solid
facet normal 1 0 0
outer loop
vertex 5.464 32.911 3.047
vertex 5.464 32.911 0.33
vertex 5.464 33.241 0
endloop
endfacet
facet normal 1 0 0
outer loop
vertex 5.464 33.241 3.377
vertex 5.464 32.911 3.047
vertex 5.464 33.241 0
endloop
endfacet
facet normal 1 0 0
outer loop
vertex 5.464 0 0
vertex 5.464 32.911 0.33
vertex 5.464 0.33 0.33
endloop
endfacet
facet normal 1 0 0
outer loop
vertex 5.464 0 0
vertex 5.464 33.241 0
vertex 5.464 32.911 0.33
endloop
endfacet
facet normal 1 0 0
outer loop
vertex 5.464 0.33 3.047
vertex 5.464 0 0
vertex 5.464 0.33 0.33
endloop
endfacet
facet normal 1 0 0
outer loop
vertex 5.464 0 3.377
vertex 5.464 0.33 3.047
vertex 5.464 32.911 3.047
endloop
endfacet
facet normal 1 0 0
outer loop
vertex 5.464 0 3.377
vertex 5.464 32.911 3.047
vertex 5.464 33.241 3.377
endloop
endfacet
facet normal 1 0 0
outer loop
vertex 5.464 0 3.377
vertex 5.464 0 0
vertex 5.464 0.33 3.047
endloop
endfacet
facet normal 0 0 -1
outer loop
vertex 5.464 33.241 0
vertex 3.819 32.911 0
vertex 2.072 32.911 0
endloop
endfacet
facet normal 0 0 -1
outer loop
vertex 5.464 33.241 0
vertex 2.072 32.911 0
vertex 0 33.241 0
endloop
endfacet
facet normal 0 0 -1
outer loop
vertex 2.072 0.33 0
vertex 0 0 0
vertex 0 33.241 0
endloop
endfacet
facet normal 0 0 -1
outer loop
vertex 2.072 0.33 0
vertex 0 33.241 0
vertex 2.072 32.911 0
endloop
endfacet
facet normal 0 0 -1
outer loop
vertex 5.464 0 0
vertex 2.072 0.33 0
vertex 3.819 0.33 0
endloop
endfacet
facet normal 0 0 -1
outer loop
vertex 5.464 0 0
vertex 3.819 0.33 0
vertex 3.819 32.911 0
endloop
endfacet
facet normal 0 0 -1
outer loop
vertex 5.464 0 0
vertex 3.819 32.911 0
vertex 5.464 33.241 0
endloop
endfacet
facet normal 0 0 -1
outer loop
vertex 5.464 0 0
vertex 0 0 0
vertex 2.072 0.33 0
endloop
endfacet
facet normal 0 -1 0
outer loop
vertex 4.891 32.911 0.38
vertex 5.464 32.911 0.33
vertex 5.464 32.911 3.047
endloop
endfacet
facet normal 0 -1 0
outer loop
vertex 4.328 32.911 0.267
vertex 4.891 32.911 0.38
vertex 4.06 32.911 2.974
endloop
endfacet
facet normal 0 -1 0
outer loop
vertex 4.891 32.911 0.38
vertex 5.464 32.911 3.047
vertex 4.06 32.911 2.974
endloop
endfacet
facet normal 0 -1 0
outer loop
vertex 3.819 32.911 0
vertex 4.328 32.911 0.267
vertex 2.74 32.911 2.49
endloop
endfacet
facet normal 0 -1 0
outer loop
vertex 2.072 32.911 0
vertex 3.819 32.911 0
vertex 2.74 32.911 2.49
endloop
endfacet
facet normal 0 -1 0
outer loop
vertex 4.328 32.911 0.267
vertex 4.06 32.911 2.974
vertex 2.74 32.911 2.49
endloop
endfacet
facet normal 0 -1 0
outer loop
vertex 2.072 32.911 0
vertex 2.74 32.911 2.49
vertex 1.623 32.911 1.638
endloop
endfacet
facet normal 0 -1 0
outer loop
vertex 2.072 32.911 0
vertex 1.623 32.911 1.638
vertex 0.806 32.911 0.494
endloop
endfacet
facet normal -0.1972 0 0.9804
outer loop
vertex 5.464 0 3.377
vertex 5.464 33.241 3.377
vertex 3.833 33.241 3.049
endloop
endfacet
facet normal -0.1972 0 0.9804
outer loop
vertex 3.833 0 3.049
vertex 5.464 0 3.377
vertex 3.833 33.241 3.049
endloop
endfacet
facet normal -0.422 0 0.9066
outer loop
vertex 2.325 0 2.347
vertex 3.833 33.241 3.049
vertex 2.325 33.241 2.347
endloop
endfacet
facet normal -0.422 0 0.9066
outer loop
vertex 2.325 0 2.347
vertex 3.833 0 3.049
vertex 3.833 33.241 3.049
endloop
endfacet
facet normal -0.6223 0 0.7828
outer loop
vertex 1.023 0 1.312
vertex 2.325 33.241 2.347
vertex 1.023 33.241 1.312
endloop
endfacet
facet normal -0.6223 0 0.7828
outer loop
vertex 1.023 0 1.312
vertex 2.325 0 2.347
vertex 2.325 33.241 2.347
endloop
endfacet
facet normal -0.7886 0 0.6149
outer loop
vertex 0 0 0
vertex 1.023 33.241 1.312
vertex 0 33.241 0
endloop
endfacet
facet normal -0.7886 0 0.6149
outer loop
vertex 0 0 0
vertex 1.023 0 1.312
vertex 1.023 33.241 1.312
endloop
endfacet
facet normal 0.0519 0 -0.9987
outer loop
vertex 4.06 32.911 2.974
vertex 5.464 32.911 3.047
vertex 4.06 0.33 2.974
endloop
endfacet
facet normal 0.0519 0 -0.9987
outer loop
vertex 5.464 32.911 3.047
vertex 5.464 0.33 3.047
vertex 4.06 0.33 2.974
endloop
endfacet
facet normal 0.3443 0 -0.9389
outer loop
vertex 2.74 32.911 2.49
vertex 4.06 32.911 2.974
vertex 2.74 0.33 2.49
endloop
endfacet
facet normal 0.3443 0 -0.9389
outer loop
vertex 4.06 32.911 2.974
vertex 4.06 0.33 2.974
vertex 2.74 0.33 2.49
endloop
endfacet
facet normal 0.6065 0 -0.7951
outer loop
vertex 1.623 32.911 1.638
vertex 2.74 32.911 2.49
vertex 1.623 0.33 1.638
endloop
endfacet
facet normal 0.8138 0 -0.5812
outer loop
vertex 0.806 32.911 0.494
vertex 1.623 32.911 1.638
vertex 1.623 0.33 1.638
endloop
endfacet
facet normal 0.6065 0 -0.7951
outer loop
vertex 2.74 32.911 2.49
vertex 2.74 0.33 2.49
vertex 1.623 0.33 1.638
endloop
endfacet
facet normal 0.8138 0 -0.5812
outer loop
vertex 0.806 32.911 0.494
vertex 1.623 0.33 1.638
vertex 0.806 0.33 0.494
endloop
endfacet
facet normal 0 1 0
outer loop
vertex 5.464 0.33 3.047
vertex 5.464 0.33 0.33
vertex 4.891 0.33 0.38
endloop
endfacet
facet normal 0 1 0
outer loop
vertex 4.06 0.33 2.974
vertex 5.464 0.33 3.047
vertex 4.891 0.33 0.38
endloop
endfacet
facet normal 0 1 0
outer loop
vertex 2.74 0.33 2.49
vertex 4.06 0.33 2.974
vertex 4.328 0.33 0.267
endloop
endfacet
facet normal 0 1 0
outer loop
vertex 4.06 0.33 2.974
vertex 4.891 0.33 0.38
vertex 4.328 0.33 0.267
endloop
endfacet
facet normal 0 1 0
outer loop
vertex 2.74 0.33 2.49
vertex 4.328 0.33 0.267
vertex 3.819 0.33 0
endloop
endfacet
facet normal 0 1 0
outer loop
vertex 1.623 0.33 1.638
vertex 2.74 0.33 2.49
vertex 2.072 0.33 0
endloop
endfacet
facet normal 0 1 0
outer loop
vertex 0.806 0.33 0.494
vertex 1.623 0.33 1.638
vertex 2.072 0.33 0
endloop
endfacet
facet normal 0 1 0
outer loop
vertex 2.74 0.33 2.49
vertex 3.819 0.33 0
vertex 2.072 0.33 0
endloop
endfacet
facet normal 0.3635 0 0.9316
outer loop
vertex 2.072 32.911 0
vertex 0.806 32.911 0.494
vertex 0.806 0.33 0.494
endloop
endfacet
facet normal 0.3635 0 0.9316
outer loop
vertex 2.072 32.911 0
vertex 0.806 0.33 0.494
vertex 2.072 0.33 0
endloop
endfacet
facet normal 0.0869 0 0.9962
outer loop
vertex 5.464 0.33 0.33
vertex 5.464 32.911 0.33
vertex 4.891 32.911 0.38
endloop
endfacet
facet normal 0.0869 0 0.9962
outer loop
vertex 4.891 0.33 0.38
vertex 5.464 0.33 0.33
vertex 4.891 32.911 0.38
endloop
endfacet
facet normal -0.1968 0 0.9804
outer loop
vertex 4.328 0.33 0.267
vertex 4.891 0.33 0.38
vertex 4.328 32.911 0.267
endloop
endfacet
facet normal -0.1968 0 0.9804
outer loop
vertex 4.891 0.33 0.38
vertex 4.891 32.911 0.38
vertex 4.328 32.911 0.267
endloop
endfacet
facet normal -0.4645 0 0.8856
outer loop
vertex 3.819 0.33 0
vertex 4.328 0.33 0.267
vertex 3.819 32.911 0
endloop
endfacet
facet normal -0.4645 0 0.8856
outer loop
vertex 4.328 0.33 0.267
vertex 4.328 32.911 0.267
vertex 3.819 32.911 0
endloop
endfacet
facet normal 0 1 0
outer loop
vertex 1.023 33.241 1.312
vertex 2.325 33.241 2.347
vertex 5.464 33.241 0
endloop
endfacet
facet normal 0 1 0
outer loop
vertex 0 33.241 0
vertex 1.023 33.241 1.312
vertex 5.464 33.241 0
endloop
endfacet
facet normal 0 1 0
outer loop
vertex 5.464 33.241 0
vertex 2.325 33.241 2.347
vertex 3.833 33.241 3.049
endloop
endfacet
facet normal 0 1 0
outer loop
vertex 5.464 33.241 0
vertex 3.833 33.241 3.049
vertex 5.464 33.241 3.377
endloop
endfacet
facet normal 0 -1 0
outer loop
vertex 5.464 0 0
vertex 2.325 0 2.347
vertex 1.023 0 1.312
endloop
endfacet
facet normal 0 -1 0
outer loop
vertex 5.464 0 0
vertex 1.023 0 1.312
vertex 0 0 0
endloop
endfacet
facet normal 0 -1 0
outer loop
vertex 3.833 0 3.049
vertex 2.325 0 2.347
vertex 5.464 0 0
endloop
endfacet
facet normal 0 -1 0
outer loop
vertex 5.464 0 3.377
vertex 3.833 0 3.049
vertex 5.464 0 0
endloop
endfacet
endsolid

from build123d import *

# Parameters (mm, degrees)
F1_DEPTH = 33.24098
F2_W     = 32.58058
F2_H     = 2.716841


with BuildPart() as f1:
    # F0 (on Front) → F1 (new body)
    with BuildSketch(Plane.XZ):
        with BuildLine():
            ThreePointArc((5.46354, 1.68862), (3.856251, 1.234842), (2.73177, 0))
            Line((2.73177, 0), (5.46354, 0))
            Line((5.46354, 0), (5.46354, 1.68862))
        make_face()
        with BuildLine():
            ThreePointArc((5.46354, 3.377241), (2.324843, 2.346928), (0, 0))
            Line((0, 0), (2.73177, 0))
            ThreePointArc((2.73177, 0), (3.856251, 1.234842), (5.46354, 1.68862))
            Line((5.46354, 1.68862), (5.46354, 3.377241))
        make_face()
    extrude(amount=-F1_DEPTH)

    # F4: sweep along a path in F3
    with BuildLine(Plane.XZ) as f4_path:
        ThreePointArc((5.46354, 1.68862), (3.506738, 1.368407), (2.071792, 0))
    # F2 (on face) → F4 (sweep, cut)
    with BuildSketch(Plane.YZ.offset(5.46354)):
        with Locations((16.62049, 1.68862)):
            Rectangle(F2_W, F2_H)
    sweep(path=f4_path.line, mode=Mode.SUBTRACT)


solid = f1.part
